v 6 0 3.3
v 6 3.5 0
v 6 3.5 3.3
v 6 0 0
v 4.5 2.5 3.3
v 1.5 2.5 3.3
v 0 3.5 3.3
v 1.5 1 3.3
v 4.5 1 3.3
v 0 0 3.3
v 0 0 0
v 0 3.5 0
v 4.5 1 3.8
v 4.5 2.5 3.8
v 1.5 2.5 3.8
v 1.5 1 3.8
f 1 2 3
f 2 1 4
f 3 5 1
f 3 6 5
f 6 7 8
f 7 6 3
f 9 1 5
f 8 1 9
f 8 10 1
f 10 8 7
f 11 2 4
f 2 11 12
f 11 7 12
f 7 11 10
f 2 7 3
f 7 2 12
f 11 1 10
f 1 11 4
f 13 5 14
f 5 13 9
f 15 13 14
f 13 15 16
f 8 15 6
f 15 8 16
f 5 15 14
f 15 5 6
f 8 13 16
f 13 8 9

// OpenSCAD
body_width = 6;
body_height = 3.5;
body_depth = 3.3;

button_width = 3;
button_height = 1.5;
button_depth = 0.5;

union() {
    // Body
    cube([body_width, body_height, body_depth]);
    
    // Button
    translate([(body_width - button_width) / 2, (body_height - button_height) / 2, body_depth])
    cube([button_width, button_height, button_depth]);
}
